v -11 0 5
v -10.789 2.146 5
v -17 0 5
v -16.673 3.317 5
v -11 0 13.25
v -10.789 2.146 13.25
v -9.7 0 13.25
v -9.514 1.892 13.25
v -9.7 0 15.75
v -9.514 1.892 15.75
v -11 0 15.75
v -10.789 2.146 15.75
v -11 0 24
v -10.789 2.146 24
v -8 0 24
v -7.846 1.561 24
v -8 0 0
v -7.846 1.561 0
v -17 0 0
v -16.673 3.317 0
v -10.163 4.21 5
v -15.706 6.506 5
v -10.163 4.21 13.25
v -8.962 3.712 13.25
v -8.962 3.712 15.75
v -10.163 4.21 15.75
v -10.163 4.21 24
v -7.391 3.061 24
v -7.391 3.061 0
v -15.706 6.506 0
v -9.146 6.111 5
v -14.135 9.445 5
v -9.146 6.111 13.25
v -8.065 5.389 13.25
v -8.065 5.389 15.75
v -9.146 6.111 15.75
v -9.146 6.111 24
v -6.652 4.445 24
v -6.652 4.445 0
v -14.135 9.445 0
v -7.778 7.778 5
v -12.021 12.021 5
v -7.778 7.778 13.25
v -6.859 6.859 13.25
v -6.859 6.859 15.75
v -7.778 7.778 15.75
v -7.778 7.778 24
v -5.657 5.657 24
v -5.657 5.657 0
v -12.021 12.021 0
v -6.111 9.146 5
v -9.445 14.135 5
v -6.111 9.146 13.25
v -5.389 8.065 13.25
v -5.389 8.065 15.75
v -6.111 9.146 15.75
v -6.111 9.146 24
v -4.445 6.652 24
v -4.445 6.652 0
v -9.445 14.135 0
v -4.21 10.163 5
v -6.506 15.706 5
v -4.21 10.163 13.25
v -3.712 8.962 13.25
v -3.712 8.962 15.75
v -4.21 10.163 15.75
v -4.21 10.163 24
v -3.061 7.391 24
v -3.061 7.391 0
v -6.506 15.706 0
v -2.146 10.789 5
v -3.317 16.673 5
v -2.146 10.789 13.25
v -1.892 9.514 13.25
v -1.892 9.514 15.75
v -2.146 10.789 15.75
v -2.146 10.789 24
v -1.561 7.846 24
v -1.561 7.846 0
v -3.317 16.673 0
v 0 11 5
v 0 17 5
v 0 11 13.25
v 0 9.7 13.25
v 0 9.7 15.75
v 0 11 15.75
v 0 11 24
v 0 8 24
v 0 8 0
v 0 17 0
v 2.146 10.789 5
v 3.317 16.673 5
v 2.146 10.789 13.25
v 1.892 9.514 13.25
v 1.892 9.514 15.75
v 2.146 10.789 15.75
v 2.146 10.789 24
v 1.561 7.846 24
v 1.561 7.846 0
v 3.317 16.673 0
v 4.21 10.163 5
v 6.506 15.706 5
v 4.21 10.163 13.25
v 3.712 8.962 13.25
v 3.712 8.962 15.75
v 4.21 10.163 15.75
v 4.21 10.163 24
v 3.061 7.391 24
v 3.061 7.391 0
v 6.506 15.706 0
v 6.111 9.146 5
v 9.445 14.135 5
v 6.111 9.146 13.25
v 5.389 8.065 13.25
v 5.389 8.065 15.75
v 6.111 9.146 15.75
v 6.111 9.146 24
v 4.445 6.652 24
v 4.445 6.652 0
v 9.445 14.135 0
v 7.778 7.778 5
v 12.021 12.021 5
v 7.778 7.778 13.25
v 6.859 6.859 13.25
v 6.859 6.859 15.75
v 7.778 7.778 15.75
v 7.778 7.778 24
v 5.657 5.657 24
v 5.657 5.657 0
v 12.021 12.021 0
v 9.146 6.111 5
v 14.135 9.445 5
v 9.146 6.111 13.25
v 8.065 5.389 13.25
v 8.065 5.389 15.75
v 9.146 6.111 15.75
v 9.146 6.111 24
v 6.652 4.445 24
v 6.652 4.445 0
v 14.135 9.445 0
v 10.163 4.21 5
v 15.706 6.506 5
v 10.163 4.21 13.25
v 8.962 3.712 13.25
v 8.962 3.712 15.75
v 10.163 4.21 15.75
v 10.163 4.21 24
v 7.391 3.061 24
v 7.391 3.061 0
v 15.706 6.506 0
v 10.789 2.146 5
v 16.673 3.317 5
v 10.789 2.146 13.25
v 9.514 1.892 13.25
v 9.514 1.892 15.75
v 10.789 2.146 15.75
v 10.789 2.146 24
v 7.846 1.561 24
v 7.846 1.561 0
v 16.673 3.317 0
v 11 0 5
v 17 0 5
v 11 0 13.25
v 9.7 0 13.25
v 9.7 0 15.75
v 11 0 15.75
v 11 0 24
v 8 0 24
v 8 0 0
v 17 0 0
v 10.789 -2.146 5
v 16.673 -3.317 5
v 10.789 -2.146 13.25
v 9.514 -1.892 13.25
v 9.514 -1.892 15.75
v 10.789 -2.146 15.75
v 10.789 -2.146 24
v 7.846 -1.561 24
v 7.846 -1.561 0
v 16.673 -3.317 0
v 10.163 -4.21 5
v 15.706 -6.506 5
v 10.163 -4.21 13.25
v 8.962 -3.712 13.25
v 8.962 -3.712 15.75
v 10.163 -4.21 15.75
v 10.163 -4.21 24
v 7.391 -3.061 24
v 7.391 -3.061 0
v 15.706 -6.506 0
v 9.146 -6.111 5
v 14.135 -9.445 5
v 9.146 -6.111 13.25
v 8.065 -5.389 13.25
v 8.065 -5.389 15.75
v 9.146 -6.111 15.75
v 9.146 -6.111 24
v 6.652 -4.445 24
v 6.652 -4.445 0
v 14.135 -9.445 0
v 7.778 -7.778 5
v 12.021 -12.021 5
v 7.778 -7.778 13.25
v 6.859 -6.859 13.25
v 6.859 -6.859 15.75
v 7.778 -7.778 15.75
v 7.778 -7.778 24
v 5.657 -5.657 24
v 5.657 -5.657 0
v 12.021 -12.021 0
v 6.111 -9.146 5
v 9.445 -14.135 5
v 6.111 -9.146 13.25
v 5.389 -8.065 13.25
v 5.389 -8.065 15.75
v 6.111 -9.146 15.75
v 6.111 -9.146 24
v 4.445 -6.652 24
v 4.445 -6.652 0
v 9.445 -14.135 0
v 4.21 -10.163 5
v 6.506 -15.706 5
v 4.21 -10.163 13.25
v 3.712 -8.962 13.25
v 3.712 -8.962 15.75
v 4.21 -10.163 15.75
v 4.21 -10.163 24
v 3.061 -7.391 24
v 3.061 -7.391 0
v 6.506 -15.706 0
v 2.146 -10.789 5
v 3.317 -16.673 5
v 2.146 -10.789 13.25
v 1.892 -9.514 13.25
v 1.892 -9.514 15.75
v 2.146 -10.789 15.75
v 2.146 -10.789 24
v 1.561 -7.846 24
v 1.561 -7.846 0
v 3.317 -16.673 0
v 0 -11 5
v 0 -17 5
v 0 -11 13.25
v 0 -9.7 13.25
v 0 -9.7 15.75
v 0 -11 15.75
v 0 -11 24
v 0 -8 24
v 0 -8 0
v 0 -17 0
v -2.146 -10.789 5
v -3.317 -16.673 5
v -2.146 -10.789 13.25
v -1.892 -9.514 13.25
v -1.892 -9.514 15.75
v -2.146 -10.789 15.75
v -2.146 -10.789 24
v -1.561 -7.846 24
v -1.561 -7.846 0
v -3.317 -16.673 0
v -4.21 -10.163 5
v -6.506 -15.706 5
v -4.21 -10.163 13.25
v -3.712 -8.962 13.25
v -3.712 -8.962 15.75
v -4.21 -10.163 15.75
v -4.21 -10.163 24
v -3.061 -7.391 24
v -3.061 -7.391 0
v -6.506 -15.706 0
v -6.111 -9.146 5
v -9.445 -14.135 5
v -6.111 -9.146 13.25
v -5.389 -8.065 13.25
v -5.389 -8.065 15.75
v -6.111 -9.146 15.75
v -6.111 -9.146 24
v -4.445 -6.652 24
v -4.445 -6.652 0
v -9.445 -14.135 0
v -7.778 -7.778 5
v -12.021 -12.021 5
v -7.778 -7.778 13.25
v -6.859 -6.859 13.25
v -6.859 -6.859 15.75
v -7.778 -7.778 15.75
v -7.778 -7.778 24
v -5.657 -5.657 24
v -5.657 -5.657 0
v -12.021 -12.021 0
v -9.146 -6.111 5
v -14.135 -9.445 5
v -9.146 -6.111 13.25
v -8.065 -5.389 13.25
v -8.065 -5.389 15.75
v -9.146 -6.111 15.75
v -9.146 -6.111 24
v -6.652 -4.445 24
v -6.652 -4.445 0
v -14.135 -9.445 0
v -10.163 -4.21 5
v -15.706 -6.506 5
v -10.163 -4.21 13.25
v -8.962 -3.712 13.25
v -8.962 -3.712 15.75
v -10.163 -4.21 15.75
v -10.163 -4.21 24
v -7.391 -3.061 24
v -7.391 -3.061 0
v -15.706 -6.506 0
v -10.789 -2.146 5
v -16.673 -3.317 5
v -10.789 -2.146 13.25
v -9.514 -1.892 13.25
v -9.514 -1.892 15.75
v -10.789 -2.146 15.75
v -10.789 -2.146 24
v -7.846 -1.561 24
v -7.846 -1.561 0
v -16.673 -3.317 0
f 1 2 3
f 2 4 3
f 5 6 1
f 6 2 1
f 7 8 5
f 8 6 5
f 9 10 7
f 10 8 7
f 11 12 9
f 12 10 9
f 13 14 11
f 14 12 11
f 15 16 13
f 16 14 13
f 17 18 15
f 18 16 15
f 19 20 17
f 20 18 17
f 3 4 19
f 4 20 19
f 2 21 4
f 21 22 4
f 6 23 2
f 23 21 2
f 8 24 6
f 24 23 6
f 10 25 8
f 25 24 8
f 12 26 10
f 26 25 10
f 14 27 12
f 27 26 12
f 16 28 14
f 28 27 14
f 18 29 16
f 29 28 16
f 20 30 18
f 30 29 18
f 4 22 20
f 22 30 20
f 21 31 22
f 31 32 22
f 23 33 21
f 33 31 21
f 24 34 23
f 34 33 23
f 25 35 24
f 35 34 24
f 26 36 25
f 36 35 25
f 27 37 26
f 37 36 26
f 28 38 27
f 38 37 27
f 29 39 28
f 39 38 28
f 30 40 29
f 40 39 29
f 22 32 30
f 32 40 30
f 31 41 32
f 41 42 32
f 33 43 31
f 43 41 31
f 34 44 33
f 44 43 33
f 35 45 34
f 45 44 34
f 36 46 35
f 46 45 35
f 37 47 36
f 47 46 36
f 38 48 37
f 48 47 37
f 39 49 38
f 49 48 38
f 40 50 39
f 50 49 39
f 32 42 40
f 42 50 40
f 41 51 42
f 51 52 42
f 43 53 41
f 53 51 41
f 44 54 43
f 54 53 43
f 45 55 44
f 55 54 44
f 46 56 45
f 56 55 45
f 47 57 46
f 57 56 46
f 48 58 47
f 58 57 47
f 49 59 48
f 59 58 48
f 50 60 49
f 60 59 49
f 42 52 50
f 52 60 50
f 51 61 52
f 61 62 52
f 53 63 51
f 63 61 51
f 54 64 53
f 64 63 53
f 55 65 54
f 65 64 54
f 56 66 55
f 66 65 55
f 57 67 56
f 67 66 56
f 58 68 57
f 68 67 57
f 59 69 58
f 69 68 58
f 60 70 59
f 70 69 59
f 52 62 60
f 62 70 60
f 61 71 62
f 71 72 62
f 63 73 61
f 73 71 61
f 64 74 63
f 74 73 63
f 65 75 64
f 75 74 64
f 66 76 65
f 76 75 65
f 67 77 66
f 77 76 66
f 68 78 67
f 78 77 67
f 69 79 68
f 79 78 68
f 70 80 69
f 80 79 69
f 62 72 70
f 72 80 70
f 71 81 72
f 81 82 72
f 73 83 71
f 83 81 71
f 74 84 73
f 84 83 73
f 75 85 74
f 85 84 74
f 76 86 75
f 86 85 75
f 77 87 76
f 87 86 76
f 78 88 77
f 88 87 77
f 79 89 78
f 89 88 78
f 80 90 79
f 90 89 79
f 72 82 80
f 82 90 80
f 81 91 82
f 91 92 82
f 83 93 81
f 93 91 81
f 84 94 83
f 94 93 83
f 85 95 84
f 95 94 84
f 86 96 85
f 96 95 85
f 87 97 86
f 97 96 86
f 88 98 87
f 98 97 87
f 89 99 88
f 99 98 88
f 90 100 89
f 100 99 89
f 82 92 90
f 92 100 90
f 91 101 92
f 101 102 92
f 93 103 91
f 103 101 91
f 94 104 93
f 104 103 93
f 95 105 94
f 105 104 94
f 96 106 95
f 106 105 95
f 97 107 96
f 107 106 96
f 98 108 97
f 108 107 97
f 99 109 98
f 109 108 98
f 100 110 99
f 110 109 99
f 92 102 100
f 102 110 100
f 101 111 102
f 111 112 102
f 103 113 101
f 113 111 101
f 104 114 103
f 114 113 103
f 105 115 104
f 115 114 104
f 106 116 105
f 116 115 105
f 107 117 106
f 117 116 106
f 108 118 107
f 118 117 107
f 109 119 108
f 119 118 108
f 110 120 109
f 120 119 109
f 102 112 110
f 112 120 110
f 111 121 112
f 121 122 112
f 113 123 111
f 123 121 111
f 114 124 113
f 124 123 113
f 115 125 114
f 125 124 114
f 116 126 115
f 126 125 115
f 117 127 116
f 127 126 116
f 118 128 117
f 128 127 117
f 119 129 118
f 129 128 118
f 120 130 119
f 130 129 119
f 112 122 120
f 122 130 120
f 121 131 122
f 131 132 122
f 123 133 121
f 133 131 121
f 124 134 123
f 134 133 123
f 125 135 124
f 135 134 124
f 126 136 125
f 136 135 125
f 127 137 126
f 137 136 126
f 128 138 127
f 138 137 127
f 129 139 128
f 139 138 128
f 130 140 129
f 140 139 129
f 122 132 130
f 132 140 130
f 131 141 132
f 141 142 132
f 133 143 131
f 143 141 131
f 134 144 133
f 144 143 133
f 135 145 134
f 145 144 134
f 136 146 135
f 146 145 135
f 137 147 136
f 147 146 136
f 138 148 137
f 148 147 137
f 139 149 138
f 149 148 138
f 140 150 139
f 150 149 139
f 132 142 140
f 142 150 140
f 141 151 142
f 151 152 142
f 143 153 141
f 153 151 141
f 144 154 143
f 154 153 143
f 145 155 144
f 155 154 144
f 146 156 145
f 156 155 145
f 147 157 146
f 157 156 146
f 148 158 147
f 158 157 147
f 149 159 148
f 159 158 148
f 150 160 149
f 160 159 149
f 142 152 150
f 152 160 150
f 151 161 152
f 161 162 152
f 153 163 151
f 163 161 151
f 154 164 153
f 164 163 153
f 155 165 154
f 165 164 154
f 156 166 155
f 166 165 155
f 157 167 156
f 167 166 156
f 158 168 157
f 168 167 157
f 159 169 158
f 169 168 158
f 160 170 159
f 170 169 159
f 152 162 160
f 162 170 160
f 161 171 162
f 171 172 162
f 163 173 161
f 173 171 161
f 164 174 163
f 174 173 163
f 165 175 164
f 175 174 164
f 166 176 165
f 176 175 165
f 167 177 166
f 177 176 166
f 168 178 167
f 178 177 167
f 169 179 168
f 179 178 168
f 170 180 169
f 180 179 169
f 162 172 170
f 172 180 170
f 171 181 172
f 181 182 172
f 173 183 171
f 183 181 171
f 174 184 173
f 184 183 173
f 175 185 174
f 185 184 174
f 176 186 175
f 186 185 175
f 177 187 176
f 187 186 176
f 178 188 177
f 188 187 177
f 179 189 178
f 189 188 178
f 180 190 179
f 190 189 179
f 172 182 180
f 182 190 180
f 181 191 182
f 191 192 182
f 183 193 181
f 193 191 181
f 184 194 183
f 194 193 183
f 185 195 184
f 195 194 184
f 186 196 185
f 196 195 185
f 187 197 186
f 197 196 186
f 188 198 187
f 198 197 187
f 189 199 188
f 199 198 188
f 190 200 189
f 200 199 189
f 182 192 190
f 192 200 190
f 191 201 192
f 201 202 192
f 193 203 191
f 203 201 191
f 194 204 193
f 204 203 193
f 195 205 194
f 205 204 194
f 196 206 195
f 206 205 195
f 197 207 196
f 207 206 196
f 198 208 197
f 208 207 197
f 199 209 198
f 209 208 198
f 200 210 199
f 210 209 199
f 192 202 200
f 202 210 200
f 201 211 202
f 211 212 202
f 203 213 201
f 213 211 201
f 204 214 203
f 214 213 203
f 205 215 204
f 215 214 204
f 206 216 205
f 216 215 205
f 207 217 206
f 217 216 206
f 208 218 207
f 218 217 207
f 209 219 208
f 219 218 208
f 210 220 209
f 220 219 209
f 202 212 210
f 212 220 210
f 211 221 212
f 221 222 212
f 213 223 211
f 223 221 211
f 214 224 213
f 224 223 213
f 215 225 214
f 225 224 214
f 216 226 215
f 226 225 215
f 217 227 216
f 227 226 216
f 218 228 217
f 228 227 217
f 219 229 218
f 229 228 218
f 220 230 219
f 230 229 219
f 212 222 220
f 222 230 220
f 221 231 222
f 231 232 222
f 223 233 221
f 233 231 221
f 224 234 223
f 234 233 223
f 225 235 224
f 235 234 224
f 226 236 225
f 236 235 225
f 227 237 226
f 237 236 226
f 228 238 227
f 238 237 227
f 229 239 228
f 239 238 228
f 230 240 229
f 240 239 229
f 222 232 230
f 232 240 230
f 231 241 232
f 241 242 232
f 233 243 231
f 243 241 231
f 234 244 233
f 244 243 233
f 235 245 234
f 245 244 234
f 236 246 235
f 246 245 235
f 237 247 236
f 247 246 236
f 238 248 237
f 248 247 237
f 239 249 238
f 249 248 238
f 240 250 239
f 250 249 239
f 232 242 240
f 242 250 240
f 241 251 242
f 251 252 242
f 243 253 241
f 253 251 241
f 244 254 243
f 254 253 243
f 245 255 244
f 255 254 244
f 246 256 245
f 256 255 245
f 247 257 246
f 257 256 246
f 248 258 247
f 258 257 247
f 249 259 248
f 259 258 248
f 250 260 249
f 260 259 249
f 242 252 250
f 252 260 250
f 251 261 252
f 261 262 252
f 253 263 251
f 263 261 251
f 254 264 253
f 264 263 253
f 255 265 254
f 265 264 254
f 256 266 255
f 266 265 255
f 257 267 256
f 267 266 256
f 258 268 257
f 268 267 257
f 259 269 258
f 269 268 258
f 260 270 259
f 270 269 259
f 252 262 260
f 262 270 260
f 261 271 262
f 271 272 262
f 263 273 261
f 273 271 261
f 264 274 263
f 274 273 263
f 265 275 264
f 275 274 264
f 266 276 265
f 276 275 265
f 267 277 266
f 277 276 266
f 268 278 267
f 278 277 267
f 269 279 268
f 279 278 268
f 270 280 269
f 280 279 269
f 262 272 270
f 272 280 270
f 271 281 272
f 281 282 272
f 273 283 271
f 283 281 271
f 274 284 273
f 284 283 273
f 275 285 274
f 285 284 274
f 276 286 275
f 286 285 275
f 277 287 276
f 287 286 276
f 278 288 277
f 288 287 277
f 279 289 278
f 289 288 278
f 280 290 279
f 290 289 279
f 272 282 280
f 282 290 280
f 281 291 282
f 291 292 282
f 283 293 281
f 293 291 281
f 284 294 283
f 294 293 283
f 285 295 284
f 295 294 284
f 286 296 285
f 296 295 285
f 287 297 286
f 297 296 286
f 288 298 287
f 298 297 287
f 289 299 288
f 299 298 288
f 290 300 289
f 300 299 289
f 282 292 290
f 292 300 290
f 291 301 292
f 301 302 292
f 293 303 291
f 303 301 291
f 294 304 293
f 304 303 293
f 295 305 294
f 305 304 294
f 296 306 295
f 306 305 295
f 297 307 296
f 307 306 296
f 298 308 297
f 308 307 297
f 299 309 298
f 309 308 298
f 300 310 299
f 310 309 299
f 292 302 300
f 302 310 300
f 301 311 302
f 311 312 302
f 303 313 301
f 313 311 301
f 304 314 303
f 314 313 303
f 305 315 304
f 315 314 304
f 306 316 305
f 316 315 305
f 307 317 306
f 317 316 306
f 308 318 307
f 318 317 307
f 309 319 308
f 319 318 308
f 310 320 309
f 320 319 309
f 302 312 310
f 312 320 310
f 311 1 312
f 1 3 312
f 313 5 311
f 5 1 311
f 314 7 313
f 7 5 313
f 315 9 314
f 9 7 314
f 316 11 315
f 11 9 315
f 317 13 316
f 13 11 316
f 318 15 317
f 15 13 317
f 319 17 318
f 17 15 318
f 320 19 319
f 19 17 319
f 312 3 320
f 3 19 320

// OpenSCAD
$fn = 32;

// ----------------------------------------------------------------------
// Grooved revolve: flanged, bore R8
// ----------------------------------------------------------------------

// --- parameters (mm) ---
bore_r = 8;               // bore radius
outer_r = 11;             // outer radius of the body
total_h = 24;             // overall height, Z
wall = 3;                 // radial wall thickness
groove_w = 2.5;           // groove width
groove_d = 1.3;           // groove depth
grooves = 1;              // number of outer grooves
flange_r = 17;            // flange radius
flange_h = 5;             // flange height

bbox_x = 2 * flange_r;  // full diameter
bore_d = 2 * bore_r;  // bore diameter
body_d = 2 * outer_r;  // body diameter
flange_d = 2 * flange_r;  // flange diameter
revolve_angle = 360;  // full turn around the Z axis

profile = [[8, 0], [11, 0], [17, 0], [17, 5], [11, 5], [11, 13.25], [9.7, 13.25], [9.7, 15.75], [11, 15.75], [11, 24], [8, 24]];  // primary outline, 11 points, counter clockwise

// --- the one profile operation ---
rotate_extrude(angle = revolve_angle) polygon(points = profile);
